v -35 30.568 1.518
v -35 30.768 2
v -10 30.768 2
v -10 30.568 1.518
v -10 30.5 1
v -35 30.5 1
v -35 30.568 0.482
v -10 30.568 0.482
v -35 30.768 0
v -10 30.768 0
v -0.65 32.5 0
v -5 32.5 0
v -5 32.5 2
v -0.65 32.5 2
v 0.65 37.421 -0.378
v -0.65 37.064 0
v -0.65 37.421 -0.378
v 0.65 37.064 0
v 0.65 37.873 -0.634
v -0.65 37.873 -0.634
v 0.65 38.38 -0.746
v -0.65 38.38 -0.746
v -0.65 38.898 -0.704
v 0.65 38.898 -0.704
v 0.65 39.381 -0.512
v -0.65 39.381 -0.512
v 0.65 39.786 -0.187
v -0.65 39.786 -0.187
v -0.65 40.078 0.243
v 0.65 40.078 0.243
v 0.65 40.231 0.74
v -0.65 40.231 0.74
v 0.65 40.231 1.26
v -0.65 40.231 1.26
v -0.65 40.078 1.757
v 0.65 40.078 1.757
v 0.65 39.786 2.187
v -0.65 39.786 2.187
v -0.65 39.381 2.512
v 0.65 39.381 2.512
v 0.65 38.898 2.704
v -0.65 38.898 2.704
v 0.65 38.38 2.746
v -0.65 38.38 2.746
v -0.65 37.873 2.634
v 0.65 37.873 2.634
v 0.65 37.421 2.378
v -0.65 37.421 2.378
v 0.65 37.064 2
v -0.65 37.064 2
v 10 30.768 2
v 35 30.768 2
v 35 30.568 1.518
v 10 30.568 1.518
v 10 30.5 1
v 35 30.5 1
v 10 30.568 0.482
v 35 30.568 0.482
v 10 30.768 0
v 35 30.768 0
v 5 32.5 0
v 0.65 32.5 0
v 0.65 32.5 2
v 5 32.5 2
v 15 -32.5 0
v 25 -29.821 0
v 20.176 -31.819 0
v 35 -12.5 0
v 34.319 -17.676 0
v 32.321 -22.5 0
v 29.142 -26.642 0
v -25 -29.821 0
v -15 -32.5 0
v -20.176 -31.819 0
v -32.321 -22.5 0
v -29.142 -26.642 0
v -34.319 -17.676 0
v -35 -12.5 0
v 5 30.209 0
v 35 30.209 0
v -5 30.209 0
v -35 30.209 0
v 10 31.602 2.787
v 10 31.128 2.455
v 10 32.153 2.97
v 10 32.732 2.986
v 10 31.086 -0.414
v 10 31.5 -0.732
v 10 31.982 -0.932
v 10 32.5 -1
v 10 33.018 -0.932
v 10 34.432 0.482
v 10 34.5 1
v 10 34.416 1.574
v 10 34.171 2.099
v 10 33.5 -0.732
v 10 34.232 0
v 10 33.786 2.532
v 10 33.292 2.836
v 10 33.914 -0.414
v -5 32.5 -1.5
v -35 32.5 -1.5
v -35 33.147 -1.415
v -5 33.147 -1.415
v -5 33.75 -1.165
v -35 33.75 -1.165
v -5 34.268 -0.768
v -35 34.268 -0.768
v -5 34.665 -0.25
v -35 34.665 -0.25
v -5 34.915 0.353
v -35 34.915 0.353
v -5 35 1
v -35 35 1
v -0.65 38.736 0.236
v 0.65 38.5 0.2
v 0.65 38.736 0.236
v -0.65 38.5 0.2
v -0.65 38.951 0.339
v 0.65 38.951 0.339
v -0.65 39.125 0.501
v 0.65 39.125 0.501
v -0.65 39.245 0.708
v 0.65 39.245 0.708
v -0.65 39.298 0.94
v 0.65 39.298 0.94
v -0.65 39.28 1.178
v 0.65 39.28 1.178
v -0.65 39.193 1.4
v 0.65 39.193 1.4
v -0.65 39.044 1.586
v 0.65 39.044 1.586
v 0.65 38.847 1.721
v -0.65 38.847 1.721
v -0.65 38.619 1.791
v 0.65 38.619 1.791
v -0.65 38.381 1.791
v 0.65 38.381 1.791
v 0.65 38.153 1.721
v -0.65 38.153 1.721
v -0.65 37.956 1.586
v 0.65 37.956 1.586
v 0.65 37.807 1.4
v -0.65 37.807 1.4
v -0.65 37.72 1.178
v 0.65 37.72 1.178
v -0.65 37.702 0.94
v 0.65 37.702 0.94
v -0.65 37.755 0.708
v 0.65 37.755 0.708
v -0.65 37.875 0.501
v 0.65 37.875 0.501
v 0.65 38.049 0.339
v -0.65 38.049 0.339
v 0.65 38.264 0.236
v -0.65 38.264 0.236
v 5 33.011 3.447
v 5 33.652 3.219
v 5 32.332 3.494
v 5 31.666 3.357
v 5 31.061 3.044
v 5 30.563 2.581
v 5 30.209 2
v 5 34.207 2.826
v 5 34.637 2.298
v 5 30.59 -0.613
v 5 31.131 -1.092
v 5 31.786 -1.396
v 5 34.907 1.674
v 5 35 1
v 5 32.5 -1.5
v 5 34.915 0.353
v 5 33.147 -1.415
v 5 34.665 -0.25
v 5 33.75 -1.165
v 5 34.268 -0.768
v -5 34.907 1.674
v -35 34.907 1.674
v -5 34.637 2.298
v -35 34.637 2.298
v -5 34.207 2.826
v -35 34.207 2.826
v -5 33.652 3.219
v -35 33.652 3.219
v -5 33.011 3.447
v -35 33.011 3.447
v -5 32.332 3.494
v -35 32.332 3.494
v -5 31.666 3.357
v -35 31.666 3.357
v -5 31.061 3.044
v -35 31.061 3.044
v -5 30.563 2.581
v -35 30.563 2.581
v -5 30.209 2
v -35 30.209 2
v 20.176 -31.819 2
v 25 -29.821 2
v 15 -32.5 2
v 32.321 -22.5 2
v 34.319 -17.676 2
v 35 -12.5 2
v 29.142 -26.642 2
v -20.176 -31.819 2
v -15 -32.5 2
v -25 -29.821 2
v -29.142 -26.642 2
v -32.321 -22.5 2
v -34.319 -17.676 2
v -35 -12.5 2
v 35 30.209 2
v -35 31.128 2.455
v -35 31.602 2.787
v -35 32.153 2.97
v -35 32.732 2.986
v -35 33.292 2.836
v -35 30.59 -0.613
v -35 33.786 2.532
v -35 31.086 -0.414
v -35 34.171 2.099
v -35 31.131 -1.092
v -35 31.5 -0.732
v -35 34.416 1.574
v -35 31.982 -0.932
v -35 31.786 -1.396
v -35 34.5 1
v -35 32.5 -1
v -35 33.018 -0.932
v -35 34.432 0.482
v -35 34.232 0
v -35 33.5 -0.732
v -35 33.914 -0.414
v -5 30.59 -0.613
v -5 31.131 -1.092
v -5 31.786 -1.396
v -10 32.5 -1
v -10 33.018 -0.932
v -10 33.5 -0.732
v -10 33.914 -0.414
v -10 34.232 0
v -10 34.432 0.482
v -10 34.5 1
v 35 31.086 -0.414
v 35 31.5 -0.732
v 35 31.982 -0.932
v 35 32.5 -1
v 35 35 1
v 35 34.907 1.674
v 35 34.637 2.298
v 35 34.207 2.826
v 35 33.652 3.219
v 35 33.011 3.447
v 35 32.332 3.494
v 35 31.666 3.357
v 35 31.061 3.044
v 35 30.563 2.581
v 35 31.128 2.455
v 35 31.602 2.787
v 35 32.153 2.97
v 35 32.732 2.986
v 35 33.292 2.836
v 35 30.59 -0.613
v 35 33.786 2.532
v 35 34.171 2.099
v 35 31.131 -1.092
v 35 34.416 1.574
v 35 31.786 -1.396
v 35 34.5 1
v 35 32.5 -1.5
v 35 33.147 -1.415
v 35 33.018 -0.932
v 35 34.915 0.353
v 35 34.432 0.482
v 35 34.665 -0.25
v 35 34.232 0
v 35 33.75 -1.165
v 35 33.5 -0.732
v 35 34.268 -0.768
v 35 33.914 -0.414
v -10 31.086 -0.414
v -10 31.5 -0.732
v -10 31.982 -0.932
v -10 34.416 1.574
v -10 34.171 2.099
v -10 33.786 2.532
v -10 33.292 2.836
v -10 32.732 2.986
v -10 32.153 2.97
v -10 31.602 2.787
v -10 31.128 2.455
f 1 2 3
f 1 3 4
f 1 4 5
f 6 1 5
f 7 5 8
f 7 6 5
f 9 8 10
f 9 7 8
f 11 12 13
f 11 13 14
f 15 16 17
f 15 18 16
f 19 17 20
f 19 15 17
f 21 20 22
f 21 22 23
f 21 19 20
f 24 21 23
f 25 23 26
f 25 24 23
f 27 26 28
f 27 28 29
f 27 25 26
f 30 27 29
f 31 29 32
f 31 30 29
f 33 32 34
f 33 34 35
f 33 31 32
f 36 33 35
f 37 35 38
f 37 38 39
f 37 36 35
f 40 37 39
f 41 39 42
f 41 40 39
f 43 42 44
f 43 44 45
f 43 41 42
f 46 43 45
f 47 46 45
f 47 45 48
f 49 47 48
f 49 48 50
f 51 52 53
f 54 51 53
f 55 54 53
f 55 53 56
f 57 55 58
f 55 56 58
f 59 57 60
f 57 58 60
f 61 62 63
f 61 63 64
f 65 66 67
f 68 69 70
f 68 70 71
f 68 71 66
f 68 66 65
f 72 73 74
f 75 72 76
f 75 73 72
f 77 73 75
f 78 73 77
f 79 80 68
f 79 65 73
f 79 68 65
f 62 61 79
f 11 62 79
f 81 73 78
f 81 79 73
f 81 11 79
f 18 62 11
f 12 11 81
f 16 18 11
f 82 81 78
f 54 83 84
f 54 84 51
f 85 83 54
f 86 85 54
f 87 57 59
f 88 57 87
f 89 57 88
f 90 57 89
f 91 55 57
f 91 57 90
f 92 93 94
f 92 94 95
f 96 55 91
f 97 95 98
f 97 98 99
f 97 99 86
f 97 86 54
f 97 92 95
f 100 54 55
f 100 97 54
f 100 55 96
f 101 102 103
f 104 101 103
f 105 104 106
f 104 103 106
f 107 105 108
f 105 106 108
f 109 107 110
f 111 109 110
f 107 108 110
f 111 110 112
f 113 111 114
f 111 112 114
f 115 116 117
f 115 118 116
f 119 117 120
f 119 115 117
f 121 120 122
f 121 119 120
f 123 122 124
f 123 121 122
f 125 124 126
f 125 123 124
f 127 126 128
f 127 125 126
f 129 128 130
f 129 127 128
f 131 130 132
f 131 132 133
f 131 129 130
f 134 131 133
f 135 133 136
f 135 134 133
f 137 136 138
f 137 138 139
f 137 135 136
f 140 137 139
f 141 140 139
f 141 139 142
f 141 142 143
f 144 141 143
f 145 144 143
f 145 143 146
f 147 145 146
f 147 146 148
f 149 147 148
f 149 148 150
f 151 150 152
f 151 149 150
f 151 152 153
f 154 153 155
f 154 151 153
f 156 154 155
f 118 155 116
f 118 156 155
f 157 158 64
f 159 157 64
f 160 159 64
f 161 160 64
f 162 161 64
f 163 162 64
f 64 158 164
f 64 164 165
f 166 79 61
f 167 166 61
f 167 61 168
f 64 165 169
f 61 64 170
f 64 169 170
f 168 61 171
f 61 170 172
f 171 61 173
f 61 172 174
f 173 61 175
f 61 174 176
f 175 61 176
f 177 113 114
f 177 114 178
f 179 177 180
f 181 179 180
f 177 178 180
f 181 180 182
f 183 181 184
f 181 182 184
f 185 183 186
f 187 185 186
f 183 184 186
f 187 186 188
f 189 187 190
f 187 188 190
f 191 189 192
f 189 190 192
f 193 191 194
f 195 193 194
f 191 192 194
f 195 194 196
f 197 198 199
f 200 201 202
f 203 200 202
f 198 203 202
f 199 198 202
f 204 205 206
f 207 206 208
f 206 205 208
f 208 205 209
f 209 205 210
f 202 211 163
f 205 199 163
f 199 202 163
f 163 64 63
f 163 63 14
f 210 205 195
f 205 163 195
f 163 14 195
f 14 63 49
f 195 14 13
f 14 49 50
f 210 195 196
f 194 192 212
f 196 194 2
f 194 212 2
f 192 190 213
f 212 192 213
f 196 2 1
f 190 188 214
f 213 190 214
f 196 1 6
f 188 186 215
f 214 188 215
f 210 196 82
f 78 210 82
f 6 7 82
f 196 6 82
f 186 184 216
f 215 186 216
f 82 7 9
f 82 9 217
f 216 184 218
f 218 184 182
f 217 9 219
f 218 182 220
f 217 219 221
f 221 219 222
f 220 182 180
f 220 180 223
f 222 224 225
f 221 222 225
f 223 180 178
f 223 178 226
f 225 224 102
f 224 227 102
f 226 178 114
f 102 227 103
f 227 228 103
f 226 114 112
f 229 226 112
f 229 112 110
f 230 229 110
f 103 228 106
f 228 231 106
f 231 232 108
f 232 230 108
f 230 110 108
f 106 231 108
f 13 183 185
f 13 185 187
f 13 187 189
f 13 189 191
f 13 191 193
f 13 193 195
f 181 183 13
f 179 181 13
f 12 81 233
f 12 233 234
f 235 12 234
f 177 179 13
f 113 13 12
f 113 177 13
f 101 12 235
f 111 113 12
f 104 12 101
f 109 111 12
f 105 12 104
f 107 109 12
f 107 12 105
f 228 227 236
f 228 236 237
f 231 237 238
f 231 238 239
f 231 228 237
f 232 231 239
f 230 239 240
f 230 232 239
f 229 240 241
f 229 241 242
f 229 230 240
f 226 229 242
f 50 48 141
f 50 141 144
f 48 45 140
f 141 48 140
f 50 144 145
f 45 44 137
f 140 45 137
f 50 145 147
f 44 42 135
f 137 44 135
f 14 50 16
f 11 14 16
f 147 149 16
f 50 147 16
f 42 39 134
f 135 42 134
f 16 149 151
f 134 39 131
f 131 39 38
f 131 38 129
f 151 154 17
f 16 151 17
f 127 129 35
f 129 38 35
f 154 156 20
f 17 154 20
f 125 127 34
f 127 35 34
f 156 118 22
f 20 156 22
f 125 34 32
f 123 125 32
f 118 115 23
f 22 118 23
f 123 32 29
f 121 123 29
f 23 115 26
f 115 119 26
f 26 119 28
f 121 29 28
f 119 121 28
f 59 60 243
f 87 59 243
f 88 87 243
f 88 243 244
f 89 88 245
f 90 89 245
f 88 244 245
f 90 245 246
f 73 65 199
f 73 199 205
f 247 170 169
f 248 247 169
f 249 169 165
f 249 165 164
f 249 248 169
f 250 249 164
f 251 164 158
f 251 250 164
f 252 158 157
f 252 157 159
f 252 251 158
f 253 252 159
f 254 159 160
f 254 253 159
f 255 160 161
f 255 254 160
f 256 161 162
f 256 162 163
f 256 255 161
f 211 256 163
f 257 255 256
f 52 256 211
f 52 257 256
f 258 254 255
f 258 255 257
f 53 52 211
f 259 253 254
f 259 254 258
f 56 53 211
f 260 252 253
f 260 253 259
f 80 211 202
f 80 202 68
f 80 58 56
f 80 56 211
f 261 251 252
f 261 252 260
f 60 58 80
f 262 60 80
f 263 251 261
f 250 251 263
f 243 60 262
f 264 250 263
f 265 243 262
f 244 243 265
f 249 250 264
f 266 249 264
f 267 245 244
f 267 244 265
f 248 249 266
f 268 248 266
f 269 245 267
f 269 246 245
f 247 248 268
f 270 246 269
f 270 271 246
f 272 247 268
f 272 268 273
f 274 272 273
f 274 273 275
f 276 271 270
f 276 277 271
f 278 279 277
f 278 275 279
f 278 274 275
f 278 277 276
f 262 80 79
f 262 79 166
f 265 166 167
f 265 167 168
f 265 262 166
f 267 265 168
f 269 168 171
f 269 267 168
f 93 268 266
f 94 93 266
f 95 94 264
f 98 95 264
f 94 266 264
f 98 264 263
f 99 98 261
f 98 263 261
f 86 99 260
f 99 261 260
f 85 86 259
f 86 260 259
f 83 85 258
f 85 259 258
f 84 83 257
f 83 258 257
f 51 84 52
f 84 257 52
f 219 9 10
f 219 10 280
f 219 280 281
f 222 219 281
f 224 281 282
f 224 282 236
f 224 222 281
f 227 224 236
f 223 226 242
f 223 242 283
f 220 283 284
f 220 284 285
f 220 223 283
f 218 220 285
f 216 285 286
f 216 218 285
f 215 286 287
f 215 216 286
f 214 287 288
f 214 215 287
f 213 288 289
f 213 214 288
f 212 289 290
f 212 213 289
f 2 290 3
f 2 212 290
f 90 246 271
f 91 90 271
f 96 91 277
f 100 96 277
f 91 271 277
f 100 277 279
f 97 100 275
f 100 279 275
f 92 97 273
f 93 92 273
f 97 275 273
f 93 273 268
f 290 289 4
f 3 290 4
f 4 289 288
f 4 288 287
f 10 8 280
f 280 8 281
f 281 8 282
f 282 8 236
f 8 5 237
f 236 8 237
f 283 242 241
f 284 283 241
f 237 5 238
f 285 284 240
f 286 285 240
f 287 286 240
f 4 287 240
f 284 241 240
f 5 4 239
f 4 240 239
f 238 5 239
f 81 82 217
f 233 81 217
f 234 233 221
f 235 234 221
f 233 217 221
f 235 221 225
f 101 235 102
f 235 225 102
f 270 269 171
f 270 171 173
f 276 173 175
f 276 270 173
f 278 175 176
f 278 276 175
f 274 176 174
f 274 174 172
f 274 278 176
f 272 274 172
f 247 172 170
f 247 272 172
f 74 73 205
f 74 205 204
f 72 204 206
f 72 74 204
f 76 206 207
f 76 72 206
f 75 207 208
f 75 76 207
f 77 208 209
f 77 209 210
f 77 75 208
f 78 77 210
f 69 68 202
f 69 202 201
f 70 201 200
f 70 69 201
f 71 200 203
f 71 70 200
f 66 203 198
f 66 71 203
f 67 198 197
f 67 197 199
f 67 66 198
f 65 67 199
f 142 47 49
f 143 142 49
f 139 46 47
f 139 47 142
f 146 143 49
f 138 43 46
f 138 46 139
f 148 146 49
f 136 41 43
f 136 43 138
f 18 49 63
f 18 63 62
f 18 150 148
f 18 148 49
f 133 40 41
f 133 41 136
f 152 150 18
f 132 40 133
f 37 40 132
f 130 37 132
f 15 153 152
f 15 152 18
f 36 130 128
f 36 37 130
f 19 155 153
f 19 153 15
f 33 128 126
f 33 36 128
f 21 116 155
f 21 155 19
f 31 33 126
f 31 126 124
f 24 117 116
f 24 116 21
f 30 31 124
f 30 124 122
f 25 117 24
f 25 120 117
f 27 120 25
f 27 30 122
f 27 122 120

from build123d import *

# Parameters (mm, degrees)
BOSS_EXTRUDE1_DEPTH = 2
SKETCH3_R           = 2.5
BOSS_EXTRUDE2_DEPTH = 30
SKETCH3_4_R         = 2
CUT_EXTRUDE2_DEPTH  = 25
SKETCH4_R           = 0.8
BOSS_EXTRUDE3_DEPTH = 0.65


with BuildPart() as part:
    # Sketch2 → Boss-Extrude1 (new body)
    with BuildSketch(Plane.XY):
        with BuildLine():
            Line((15, -32.5), (-15, -32.5))
            ThreePointArc((-15, -32.5), (-29.142135624, -26.642135624), (-35, -12.5))
            Line((-35, -12.5), (-35, 32.5))
            Line((-35, 32.5), (35, 32.5))
            Line((35, 32.5), (35, -12.5))
            ThreePointArc((35, -12.5), (29.142135624, -26.642135624), (15, -32.5))
        make_face()
    extrude(amount=BOSS_EXTRUDE1_DEPTH)

    # Sketch3 → Boss-Extrude2 (add)
    with BuildSketch(Plane(origin=(35, 0, 0), x_dir=(0, 0, -1), z_dir=(1, 0, 0))):
        with Locations((-1, 32.5)):
            Circle(SKETCH3_R)
    boss_extrude2 = extrude(amount=-BOSS_EXTRUDE2_DEPTH)

    # Sketch3<4> → Cut-Extrude2 (cut)
    with BuildSketch(Plane(origin=(35, 0, 0), x_dir=(0, 0, -1), z_dir=(1, 0, 0))):
        with Locations((-1, 32.5)):
            Circle(SKETCH3_4_R)
    cut_extrude2 = extrude(amount=-CUT_EXTRUDE2_DEPTH, mode=Mode.SUBTRACT)

    # Mirror1: Boss-Extrude2, Cut-Extrude2 across plane
    add(boss_extrude2.mirror(Plane(origin=(0, 0, 0), x_dir=(0, 0, 1), z_dir=(1, 0, 0))))
    add(cut_extrude2.mirror(Plane(origin=(0, 0, 0), x_dir=(0, 0, 1), z_dir=(1, 0, 0))), mode=Mode.SUBTRACT)

    # Sketch4 → Boss-Extrude3 (add, symmetric)
    with BuildSketch(Plane(origin=(0, 0, 0), x_dir=(0, 0, -1), z_dir=(1, 0, 0))):
        with BuildLine():
            Line((-2, 37.063859338), (-2, 32.5))
            Line((-2, 32.5), (0, 32.5))
            Line((0, 32.5), (0, 37.063859338))
            ThreePointArc((0, 37.063859338), (-1, 40.25), (-2, 37.063859338))
        make_face()
        with Locations((-1, 38.5)):
            Circle(SKETCH4_R, mode=Mode.SUBTRACT)
    extrude(amount=BOSS_EXTRUDE3_DEPTH, both=True)


solid = part.part
